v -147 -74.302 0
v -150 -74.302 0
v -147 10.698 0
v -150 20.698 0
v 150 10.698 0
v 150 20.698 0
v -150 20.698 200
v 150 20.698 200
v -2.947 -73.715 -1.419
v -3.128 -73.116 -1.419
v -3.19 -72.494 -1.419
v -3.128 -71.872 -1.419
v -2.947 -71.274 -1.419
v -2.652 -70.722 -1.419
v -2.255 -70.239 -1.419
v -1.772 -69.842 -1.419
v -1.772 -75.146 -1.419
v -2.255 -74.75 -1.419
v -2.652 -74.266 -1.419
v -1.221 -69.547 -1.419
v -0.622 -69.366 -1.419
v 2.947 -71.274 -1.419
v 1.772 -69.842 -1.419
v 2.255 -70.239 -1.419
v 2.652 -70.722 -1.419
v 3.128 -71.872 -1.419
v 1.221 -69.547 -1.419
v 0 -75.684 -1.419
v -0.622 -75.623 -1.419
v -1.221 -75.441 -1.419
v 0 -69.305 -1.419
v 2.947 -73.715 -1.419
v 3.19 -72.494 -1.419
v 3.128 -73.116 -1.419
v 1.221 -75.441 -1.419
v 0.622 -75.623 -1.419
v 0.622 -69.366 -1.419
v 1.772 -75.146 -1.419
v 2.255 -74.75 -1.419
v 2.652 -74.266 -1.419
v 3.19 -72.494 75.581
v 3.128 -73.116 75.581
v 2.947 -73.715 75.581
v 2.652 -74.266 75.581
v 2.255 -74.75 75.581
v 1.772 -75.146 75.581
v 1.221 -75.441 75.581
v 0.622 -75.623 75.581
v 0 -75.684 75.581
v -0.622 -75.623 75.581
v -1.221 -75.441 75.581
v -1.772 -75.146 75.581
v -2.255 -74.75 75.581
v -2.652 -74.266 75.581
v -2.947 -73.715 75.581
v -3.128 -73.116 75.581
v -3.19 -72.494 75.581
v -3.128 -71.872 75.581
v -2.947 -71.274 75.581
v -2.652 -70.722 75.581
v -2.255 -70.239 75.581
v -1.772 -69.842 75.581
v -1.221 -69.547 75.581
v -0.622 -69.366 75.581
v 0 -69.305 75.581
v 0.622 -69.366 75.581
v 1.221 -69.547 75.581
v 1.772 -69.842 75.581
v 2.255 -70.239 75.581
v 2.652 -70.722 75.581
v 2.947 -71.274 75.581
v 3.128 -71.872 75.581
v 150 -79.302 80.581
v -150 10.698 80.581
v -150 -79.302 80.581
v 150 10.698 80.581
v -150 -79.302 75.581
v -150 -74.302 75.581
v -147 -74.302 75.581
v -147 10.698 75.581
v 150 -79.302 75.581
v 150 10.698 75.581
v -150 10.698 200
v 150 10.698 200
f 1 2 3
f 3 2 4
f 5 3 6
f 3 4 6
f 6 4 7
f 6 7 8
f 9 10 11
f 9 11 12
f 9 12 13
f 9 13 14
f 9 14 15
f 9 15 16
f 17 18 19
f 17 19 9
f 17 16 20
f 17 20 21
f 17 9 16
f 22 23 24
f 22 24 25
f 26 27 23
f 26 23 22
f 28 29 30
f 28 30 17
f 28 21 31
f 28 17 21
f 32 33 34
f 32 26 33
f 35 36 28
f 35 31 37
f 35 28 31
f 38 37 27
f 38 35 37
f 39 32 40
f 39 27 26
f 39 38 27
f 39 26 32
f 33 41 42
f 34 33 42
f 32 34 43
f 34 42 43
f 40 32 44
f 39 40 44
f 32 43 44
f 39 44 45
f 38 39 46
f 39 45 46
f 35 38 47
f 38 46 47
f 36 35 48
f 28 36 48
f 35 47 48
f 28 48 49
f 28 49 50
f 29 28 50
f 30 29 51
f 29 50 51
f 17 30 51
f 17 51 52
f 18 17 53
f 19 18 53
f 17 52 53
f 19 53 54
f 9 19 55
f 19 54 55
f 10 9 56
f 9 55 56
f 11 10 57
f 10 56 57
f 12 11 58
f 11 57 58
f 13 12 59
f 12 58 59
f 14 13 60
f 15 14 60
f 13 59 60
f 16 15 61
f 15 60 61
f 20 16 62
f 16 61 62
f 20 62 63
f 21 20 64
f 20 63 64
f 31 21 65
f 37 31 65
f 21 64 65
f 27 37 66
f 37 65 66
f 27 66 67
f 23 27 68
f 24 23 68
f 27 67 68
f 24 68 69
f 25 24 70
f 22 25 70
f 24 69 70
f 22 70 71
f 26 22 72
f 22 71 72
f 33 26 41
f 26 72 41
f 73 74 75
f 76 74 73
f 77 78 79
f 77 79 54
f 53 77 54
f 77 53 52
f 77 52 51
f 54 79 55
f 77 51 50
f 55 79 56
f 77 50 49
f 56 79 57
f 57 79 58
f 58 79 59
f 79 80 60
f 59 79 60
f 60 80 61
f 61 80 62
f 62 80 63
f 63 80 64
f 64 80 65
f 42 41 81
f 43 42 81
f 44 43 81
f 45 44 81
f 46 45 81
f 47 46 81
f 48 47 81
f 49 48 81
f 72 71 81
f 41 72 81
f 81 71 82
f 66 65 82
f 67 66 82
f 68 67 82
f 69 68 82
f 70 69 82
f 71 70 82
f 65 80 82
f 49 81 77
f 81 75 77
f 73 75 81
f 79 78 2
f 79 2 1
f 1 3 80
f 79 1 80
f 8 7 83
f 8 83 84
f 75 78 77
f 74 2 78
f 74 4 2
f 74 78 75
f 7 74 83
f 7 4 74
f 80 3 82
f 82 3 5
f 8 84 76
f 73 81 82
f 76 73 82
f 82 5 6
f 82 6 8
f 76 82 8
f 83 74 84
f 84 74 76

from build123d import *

# Parameters (mm, degrees)
F0_W     = 300
F0_H     = 10
F1_DEPTH = 200
F2_W     = 300
F2_H     = 5
F3_DEPTH = 90
F4_W     = 3
F4_H     = 75.580552
F5_DEPTH = 85
F6_R     = 3.189663
F7_DEPTH = 77


with BuildPart() as f1:
    # F0 (on Top) → F1 (new body)
    with BuildSketch(Plane.XY):
        with Locations((0, 15.697824)):
            Rectangle(F0_W, F0_H)
    extrude(amount=F1_DEPTH)

    # F2 (on face) → F3 (join)
    with BuildSketch(Plane.XZ.offset(-10.697824)):
        with Locations((0, 78.080552)):
            Rectangle(F2_W, F2_H)
    extrude(amount=F3_DEPTH)

    # F4 (on face) → F5 (join)
    with BuildSketch(Plane.XZ.offset(-10.697824)):
        with Locations((-148.5, 37.790276)):
            Rectangle(F4_W, F4_H)
    extrude(amount=F5_DEPTH)

    # F6 (on face) → F7 (join)
    with BuildSketch(Plane(origin=(0, 0, 75.580552), x_dir=(1, 0, 0), z_dir=(0, 0, -1))):
        with Locations((0, 72.494209)):
            Circle(F6_R)
    extrude(amount=F7_DEPTH)


solid = f1.part
